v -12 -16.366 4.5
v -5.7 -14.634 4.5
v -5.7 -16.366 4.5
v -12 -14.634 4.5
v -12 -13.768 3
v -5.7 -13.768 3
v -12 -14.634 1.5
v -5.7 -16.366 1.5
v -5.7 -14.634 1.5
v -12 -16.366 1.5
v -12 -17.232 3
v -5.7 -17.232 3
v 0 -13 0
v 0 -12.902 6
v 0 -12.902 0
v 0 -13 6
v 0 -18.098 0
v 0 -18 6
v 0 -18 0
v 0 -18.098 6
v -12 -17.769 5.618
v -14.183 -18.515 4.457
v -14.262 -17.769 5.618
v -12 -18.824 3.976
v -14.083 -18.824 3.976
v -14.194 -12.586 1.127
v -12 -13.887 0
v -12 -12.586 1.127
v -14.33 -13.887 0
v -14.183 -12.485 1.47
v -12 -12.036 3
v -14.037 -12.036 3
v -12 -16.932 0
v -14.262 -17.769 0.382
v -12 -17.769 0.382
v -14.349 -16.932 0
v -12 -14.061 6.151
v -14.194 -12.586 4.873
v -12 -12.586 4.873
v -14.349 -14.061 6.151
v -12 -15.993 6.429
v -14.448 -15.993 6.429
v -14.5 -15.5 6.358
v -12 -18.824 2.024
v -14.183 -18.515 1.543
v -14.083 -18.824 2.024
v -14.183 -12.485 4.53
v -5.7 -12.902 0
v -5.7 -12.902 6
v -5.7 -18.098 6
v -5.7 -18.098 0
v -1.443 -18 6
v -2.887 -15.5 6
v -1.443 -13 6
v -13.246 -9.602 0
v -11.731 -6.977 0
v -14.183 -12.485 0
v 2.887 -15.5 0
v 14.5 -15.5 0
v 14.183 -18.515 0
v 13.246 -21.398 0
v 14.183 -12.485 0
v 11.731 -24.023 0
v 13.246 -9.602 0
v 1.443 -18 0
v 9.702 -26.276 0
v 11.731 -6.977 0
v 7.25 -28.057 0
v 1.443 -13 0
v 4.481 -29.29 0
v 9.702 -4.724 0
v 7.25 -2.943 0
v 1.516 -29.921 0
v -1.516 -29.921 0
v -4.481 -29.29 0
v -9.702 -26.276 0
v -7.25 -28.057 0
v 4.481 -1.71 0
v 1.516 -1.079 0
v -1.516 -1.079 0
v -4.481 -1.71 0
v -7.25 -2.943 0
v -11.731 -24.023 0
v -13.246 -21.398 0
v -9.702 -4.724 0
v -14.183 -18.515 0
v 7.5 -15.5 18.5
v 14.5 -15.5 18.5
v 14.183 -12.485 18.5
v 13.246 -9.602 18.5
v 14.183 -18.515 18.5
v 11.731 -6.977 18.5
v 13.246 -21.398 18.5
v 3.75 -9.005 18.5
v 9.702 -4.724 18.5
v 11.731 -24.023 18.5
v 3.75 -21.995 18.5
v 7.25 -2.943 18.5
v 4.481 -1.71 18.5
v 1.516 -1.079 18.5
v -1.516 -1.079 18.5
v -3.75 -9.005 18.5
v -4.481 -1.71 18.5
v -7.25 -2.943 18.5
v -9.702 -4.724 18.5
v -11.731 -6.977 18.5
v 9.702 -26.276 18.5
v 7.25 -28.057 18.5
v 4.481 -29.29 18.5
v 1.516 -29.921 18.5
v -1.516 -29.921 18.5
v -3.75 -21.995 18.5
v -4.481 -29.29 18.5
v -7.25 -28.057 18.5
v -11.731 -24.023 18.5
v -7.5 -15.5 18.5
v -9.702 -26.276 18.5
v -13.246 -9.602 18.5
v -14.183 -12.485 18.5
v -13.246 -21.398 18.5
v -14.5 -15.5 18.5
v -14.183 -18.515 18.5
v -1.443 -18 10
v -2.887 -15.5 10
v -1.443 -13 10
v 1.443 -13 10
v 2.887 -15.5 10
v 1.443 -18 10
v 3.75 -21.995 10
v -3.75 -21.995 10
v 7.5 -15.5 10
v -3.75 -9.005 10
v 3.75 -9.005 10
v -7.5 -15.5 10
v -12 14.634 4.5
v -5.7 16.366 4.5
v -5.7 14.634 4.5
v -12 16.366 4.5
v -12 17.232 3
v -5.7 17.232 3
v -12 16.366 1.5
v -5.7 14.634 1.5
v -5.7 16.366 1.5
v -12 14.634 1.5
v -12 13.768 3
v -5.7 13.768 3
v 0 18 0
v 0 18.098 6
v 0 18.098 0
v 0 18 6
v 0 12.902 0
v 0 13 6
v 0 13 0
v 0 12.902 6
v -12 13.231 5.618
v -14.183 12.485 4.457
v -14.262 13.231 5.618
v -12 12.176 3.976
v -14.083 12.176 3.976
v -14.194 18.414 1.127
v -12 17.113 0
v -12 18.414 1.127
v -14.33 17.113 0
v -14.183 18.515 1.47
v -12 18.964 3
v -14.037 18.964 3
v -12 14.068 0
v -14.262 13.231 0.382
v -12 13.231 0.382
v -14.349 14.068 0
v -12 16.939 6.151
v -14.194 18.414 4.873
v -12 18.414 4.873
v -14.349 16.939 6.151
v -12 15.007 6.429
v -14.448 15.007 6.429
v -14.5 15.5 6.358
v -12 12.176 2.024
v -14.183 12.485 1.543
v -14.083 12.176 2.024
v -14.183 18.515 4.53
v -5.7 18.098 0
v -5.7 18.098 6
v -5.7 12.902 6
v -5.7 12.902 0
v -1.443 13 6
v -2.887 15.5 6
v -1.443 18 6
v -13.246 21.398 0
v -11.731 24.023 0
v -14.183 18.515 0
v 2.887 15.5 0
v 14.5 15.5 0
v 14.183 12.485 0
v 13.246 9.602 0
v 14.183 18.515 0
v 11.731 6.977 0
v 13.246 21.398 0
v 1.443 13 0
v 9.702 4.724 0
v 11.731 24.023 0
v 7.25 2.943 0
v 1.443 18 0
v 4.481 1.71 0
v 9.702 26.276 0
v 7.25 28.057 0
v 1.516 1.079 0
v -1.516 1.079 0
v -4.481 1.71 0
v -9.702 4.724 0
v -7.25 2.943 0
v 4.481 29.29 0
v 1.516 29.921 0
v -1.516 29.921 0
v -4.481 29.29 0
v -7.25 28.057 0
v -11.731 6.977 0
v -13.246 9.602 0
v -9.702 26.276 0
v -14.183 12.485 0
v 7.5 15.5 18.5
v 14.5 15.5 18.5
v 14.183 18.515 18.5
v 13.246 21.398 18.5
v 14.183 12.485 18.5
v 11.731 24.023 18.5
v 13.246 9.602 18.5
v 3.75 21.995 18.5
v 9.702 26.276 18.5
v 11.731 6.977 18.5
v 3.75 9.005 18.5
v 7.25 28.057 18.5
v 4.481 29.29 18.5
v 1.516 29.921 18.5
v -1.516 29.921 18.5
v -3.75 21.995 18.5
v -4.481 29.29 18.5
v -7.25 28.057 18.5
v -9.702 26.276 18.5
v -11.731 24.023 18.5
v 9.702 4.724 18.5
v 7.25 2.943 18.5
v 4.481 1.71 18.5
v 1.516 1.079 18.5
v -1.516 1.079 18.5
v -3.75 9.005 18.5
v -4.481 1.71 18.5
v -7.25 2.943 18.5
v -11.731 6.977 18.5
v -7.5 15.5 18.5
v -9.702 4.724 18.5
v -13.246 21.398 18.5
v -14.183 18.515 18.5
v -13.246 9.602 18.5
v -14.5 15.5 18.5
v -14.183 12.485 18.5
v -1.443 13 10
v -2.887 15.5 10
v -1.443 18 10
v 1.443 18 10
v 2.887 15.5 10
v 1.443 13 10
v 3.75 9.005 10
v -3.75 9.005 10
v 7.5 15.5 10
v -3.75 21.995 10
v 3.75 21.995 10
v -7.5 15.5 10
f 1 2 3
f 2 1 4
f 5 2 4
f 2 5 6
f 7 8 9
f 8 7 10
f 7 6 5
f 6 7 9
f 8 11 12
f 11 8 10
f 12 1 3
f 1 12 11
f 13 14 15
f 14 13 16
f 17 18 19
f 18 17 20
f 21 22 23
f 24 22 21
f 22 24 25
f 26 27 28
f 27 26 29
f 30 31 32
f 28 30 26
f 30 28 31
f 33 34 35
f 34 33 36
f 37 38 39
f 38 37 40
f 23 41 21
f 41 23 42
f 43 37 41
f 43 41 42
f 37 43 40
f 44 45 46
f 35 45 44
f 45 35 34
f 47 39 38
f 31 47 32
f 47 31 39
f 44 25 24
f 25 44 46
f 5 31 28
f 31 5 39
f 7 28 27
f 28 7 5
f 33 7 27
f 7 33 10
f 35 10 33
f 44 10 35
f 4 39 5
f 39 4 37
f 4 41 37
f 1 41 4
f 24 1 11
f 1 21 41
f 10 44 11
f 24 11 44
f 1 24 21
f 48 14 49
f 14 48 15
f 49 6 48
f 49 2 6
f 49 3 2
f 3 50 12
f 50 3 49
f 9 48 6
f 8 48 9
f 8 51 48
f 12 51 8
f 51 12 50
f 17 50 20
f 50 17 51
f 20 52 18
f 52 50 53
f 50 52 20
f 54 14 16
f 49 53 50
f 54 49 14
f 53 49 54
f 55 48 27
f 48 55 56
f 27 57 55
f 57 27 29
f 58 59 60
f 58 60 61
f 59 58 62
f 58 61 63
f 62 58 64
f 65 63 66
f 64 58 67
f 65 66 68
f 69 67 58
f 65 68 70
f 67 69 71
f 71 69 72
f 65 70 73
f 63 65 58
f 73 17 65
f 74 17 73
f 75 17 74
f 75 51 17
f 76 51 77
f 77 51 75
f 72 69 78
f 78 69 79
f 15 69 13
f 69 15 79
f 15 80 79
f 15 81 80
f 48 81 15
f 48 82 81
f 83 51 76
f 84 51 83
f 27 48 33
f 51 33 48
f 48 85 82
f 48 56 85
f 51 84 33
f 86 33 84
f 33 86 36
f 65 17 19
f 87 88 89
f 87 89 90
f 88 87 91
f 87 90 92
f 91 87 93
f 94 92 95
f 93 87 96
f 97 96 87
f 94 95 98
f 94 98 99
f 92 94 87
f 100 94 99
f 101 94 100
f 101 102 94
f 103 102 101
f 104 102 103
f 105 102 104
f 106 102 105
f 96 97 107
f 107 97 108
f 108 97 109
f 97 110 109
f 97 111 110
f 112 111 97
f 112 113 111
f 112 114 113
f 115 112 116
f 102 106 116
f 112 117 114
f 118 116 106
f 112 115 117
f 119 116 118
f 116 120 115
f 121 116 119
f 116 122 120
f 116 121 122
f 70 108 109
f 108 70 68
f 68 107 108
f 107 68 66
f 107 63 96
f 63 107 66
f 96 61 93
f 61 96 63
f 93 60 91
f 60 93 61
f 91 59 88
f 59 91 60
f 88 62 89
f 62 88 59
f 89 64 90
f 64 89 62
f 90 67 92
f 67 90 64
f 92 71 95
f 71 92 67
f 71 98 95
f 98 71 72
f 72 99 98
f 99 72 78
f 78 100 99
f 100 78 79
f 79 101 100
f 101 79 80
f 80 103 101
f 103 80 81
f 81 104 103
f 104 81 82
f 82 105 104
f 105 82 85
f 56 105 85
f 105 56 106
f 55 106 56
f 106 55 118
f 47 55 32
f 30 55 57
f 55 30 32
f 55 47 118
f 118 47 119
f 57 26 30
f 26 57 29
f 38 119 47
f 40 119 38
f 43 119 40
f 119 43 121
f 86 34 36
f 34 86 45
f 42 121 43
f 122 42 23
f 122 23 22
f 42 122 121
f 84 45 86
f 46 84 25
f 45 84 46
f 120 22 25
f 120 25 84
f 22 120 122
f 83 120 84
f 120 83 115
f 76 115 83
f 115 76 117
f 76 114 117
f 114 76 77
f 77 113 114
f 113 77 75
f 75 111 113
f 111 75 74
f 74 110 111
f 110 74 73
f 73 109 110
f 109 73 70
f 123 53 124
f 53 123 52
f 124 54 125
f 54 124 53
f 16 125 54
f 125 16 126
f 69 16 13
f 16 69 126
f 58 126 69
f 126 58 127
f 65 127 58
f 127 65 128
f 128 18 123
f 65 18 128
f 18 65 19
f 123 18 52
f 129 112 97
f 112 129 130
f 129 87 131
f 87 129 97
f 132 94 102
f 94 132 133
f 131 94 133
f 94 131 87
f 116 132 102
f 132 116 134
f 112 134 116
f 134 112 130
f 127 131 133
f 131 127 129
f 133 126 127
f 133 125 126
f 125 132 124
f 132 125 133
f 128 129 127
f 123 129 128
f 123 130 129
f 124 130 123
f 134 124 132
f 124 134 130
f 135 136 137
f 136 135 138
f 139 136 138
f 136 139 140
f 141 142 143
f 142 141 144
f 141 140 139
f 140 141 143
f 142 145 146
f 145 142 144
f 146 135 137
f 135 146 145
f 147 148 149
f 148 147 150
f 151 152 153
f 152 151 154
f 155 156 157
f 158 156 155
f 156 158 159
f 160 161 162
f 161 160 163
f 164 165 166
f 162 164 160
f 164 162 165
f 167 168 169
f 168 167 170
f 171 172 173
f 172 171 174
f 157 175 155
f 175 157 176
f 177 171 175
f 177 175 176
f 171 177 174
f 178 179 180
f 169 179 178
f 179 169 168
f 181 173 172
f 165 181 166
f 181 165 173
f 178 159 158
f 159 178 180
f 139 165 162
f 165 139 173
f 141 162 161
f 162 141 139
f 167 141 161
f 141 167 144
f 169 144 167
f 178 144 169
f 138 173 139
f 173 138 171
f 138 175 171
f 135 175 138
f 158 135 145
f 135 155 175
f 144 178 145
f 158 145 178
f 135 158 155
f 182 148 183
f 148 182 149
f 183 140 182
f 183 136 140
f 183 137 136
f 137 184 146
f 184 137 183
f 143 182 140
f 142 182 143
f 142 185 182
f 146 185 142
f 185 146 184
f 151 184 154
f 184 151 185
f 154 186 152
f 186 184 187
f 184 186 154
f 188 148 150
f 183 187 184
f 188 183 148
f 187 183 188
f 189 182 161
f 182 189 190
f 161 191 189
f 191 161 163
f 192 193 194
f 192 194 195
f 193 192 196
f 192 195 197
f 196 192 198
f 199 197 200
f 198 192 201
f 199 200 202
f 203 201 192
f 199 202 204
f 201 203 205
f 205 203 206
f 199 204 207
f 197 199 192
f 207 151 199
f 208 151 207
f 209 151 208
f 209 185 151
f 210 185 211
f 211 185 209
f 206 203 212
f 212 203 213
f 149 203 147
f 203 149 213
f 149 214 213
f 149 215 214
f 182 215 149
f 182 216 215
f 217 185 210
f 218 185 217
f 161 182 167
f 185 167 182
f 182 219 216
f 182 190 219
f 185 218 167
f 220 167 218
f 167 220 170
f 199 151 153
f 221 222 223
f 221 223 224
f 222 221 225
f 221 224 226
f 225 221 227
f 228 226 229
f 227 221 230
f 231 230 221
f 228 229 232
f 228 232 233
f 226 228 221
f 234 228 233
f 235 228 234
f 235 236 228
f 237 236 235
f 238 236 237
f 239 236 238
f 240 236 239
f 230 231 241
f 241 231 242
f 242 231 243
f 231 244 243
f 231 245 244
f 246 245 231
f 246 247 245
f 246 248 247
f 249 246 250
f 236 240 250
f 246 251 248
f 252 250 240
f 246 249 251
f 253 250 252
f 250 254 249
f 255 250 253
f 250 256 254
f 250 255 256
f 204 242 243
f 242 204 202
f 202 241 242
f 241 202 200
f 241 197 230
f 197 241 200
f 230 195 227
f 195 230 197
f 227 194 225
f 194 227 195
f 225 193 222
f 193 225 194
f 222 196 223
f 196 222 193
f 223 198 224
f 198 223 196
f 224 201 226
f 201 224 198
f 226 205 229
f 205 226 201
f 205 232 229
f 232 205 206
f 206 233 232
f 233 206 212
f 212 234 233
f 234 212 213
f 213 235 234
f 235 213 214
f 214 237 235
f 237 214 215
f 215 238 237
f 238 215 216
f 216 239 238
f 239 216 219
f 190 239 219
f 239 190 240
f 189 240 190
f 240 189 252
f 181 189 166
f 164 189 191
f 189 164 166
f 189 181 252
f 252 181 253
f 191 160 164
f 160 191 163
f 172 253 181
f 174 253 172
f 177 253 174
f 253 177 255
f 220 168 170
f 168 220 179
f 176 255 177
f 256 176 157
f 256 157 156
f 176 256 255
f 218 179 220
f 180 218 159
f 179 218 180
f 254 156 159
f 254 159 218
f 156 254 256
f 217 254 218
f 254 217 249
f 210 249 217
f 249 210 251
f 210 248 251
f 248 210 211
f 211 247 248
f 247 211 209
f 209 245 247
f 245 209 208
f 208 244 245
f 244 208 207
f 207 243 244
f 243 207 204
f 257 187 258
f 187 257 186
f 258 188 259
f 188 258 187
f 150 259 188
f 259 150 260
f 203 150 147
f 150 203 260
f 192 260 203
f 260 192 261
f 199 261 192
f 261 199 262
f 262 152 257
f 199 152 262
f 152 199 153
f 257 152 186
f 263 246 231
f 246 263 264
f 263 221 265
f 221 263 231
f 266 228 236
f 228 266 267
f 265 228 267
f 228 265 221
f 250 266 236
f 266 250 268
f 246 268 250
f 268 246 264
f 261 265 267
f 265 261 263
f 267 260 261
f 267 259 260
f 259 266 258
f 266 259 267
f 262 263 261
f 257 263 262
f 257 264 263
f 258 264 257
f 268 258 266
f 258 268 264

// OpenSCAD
include <3dm1.scad>;

!for(side = [-1,1]) translate([0, side * motor_screw_spacing / 2, 0]) leadscrew_coupler();
